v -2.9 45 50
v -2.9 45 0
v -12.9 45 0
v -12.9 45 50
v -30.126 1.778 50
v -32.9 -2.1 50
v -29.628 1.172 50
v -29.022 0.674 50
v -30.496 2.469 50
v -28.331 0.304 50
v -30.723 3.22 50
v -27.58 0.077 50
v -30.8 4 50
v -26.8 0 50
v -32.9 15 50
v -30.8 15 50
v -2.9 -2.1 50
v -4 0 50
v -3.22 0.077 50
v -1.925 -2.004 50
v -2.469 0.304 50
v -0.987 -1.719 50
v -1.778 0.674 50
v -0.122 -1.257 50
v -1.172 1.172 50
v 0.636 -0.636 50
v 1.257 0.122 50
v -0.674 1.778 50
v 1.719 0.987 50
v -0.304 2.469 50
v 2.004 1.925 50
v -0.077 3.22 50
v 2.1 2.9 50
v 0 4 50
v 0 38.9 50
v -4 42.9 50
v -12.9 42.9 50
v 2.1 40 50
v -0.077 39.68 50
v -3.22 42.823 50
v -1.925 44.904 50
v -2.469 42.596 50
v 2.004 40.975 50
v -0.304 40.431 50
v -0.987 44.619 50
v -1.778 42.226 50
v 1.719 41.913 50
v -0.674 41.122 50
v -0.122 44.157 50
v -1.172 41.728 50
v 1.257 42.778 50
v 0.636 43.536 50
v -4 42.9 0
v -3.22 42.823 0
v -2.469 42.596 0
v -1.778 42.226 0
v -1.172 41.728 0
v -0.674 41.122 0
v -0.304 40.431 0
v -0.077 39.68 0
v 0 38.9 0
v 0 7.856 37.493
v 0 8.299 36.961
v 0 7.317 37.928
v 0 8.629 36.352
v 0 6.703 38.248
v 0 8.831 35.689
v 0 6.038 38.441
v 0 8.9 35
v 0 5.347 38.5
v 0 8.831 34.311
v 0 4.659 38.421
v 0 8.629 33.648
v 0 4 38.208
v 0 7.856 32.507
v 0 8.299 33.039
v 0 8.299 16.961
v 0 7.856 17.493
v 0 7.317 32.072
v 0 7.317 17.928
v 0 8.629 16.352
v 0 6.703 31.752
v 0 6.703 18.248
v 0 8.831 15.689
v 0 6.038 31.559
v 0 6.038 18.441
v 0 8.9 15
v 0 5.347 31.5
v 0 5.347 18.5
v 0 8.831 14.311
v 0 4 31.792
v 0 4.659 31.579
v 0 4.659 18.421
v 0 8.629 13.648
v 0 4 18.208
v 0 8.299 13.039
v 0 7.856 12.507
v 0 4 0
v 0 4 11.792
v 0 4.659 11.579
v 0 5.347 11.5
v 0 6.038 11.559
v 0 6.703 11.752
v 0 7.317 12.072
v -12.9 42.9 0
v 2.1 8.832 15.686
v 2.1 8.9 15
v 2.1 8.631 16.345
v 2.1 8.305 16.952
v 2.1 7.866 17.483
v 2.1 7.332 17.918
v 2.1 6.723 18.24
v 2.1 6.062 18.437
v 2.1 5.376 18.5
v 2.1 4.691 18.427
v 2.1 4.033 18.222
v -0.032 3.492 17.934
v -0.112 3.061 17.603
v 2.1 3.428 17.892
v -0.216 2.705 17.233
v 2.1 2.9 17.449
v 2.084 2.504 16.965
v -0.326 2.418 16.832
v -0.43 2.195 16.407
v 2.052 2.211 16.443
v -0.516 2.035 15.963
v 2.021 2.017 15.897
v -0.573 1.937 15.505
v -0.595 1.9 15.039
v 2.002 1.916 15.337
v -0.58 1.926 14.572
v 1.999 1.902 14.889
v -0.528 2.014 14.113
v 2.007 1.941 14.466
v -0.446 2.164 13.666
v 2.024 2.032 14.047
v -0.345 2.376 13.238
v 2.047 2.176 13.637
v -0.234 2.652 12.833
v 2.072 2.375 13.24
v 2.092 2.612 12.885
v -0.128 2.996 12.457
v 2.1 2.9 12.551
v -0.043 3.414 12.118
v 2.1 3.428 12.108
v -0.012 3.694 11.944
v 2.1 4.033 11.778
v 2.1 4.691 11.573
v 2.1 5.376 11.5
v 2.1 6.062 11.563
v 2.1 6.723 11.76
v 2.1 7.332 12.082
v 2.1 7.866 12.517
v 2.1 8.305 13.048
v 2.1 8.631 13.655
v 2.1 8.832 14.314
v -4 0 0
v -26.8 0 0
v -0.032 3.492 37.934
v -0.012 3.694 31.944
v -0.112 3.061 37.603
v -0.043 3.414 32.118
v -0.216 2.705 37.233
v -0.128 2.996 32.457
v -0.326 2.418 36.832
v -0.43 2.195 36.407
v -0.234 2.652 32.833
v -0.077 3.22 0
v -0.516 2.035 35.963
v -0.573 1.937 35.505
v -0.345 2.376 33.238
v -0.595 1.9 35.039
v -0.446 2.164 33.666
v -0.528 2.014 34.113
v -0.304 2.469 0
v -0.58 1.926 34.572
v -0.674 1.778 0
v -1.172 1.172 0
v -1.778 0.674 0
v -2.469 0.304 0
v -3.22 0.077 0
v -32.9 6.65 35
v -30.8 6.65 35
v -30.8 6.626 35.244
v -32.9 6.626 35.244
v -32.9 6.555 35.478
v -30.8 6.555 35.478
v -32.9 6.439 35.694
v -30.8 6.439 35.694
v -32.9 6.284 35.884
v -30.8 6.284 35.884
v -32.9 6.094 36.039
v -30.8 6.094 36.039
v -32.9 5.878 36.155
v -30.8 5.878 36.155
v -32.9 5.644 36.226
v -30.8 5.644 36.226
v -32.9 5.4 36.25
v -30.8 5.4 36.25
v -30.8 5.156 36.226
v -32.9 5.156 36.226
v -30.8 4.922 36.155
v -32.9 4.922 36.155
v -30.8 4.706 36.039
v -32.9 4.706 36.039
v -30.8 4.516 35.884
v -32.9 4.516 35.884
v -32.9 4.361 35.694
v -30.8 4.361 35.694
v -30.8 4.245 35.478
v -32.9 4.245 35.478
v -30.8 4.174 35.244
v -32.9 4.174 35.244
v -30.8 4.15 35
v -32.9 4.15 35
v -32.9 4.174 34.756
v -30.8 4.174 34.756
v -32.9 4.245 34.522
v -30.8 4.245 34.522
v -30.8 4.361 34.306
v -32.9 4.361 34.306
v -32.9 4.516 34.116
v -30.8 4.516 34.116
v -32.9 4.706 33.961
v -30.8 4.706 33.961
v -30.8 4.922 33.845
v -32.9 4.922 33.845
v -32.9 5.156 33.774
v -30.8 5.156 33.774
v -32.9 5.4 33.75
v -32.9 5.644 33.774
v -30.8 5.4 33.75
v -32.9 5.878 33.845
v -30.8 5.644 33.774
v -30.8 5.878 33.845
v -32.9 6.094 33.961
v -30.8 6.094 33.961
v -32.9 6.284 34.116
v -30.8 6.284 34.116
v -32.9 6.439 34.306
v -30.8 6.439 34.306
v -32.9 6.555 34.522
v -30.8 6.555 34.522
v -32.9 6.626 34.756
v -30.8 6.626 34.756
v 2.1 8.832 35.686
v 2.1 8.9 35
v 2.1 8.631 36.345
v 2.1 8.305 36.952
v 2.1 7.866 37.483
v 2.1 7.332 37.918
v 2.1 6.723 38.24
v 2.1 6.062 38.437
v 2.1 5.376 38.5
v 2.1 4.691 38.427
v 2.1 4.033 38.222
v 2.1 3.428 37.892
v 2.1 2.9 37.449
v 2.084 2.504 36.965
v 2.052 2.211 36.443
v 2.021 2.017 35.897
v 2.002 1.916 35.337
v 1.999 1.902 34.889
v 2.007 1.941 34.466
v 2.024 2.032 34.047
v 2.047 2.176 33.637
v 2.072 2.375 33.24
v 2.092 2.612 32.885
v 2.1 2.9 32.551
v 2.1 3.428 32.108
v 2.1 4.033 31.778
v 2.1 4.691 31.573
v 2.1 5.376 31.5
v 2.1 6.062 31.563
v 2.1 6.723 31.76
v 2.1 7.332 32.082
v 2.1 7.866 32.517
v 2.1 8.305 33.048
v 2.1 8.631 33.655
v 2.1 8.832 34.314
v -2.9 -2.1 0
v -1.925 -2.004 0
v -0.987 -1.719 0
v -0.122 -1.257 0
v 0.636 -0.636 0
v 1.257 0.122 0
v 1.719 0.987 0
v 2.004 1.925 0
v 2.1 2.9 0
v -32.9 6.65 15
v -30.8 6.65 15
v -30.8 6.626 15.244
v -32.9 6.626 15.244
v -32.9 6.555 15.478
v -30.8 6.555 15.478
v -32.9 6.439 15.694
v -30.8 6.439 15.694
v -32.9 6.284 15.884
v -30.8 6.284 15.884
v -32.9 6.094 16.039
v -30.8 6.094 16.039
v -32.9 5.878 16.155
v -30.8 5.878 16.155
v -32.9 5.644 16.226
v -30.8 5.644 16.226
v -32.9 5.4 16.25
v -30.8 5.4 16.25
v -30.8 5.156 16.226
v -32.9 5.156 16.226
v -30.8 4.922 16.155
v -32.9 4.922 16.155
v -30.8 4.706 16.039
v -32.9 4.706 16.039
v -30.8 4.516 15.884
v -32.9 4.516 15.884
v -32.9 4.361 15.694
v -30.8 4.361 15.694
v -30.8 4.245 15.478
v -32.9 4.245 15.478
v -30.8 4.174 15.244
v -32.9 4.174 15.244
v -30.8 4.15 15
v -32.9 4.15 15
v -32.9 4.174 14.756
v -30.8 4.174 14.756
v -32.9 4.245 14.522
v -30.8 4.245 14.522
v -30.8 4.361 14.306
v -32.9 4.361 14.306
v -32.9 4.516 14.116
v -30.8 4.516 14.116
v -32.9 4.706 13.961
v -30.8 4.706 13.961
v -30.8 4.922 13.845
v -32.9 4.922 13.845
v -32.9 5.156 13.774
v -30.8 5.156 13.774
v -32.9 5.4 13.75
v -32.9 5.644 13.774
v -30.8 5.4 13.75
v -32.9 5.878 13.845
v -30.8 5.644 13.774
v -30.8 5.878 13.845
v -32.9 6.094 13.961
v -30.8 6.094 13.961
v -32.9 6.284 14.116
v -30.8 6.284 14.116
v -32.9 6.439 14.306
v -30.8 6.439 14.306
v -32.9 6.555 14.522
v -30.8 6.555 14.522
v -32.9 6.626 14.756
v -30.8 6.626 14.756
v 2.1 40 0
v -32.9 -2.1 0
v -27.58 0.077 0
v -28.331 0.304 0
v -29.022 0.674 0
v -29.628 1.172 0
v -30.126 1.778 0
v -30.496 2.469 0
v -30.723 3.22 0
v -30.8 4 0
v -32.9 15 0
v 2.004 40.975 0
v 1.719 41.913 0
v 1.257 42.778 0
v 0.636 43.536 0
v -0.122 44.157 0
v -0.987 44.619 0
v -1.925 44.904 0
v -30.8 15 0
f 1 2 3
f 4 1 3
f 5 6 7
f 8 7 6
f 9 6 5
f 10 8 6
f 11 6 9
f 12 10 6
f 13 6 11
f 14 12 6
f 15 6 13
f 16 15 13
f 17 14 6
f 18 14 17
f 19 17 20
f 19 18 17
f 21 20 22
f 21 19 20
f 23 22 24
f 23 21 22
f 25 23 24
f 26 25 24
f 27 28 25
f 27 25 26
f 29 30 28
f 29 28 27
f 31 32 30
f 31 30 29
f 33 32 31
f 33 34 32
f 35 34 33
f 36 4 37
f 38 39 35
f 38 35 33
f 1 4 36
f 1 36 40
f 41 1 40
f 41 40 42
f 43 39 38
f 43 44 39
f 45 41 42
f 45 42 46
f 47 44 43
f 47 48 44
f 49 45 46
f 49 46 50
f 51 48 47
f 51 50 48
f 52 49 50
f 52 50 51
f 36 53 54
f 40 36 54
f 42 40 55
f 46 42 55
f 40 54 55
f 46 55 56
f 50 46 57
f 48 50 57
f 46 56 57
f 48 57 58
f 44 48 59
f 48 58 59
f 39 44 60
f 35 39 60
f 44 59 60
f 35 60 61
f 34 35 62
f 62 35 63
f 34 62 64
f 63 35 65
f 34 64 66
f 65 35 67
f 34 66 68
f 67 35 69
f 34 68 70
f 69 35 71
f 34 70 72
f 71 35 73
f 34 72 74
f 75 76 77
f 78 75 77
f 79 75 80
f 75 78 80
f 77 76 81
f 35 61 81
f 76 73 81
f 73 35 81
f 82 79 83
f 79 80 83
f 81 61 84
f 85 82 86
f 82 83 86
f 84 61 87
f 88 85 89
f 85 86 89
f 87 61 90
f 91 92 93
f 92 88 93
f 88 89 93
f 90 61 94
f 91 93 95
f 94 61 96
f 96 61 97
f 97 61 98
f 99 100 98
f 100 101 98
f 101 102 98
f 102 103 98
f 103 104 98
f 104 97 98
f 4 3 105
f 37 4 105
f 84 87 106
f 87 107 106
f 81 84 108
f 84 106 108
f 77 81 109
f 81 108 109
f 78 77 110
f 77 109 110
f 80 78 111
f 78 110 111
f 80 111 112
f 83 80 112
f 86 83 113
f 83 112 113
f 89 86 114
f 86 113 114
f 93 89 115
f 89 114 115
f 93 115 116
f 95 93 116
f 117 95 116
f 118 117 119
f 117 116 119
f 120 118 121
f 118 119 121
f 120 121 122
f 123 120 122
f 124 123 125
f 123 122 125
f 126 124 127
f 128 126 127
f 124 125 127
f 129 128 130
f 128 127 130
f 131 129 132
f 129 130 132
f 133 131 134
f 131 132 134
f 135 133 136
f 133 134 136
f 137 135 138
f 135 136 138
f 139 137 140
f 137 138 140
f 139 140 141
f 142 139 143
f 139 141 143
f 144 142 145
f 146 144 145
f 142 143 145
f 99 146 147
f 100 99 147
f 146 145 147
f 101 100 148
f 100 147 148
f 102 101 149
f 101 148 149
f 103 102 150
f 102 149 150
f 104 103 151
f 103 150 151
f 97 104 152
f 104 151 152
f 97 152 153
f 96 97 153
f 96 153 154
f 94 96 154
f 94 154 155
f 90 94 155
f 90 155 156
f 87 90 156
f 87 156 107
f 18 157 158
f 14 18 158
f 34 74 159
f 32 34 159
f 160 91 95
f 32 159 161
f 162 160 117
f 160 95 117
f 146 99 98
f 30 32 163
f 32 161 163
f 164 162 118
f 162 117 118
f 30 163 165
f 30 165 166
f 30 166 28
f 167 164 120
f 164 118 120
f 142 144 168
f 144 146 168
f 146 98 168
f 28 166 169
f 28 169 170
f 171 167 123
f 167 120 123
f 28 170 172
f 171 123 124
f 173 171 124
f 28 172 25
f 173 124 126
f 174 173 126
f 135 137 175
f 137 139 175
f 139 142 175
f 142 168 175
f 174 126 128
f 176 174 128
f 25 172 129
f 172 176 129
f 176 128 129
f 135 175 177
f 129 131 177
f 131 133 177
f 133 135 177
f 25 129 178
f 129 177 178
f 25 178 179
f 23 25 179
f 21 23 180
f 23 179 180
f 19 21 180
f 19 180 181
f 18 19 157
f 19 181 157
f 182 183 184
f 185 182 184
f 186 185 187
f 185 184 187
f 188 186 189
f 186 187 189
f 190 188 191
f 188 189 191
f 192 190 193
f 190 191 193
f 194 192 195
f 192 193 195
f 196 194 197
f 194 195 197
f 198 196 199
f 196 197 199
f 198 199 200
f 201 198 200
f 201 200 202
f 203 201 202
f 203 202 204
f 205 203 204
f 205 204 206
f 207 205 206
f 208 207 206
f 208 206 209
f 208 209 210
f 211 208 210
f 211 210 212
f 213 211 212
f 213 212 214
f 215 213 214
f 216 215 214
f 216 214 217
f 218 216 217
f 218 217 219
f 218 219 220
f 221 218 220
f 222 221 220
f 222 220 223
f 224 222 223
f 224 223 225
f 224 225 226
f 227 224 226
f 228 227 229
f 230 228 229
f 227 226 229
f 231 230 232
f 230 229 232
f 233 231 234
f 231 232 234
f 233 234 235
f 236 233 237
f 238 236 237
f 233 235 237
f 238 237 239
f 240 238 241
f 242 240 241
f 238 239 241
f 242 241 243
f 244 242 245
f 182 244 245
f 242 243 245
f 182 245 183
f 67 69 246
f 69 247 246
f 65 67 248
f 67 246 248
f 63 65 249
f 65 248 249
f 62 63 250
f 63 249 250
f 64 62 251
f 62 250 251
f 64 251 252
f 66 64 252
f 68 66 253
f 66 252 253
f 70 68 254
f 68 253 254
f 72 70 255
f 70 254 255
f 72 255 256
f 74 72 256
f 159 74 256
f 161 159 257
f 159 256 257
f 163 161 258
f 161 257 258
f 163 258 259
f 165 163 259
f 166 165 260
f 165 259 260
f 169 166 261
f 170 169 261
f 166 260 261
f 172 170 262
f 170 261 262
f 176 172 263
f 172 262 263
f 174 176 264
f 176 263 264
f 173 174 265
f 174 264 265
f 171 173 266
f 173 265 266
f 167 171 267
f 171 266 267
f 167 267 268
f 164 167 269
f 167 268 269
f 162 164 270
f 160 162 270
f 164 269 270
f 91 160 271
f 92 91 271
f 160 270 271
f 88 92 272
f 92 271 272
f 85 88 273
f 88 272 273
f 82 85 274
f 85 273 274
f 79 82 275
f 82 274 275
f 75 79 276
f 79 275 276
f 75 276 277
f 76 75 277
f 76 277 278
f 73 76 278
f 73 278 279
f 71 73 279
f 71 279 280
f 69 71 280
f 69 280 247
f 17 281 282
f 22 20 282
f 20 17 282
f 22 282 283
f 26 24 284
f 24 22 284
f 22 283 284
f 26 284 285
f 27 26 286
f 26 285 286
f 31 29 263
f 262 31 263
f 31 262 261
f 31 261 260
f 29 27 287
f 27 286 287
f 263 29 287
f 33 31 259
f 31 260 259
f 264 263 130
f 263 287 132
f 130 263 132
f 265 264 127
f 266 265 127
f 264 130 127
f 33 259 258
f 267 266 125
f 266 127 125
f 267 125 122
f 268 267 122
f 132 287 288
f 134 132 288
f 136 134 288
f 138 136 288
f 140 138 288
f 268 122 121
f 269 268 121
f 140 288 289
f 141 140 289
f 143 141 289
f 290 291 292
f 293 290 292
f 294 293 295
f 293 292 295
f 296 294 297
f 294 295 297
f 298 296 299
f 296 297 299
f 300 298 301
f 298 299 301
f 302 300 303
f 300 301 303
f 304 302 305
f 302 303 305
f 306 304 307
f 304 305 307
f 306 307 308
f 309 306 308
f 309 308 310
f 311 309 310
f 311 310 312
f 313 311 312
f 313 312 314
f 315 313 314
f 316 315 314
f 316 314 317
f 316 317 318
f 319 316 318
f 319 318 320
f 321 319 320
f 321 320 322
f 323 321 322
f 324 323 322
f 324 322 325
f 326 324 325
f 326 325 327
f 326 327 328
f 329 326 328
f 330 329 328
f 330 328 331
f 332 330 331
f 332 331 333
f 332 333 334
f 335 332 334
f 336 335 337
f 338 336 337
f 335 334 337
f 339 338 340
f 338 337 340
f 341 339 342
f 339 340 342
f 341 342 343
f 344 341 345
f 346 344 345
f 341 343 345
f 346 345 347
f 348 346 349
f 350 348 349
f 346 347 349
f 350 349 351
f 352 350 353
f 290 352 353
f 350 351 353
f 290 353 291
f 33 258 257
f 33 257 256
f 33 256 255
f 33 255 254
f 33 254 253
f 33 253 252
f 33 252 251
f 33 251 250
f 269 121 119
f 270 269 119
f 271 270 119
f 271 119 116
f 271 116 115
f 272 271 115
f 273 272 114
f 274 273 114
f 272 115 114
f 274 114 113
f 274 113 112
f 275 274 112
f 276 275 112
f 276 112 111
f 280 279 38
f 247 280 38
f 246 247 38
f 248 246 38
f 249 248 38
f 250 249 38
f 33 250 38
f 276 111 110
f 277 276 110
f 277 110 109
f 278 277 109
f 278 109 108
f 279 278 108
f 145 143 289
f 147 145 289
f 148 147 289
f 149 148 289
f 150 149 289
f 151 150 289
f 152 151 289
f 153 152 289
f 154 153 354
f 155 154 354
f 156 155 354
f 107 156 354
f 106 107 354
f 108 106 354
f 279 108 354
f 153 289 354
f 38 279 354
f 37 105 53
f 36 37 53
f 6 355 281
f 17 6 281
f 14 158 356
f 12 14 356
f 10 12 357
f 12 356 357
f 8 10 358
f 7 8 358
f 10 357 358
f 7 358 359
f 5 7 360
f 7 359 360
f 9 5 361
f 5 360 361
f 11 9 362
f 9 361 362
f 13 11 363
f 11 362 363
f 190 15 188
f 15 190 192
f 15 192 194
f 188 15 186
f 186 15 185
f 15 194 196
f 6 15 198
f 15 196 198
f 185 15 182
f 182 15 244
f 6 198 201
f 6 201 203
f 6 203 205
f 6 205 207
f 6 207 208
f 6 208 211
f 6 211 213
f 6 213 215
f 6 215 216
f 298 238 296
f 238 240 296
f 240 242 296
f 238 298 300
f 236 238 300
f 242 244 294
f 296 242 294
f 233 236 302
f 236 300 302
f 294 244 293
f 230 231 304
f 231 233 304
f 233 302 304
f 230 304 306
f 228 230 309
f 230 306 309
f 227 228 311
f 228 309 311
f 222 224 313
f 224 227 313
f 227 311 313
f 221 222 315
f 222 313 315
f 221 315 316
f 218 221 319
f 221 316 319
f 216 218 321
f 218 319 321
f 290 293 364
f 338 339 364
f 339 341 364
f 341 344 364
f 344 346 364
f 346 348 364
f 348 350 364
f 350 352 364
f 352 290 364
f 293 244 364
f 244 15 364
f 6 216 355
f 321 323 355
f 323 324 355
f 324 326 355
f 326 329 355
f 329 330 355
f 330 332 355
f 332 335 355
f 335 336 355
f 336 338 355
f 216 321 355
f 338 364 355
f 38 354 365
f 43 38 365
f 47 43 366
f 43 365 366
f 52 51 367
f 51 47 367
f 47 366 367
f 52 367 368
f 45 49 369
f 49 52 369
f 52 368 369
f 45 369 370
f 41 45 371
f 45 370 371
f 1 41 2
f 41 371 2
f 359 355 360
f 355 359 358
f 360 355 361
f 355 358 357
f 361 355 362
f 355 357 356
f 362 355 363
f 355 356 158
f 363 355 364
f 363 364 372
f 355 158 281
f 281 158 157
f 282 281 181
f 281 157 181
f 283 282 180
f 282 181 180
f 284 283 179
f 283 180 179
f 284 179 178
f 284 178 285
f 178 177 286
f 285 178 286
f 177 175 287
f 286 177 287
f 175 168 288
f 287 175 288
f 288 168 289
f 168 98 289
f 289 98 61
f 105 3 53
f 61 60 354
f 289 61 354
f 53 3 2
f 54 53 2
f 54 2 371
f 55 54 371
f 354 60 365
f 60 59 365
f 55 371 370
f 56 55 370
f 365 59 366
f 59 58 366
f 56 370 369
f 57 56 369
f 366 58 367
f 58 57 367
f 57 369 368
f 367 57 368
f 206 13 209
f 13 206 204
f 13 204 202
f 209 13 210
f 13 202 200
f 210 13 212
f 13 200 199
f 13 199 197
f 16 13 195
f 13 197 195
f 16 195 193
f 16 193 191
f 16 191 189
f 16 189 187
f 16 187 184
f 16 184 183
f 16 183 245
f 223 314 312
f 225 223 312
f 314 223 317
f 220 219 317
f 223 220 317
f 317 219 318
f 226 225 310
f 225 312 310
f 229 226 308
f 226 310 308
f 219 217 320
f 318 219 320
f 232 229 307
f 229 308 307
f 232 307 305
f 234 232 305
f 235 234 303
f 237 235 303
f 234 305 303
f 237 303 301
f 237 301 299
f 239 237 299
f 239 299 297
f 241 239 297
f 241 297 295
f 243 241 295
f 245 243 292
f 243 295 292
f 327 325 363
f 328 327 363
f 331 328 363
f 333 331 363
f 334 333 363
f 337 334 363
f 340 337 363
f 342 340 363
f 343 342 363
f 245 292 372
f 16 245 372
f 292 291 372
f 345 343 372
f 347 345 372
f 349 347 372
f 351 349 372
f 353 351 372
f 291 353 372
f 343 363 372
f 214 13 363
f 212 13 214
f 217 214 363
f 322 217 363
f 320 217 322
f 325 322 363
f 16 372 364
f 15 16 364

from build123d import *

# Parameters (mm, degrees)
F1_DEPTH      = 50
F2_R          = 1.25
F3_DEPTH      = 32.901
F2_R_2        = 3.5
F4_DEPTH      = 2.1
F4_DEPTH_BACK = 10
F5_T1_DEPTH   = 75


# Not quite as in the source:
# - a fillet or chamfer that OpenCascade refuses, or shapes differently, is made with other operations: its cross-section is extruded or revolved along the edge and cut away or added


with BuildPart() as f1:
    # F0 (on Top) → F1 (new body)
    with BuildSketch(Plane.XY):
        with BuildLine():
            ThreePointArc((0, 4), (-1.1715728753, 1.1715728753), (-4, 0))
            Line((-4, 0), (-26.8, 0))
            ThreePointArc((-26.8, 0), (-29.6284271247, 1.1715728753), (-30.8, 4))
            Line((-30.8, 4), (-30.8, 15))
            Line((-30.8, 15), (-32.9, 15))
            Line((-32.9, 15), (-32.9, -2.1))
            Line((-32.9, -2.1), (2.1, -2.1))
            Line((2.1, -2.1), (2.1, 45))
            Line((2.1, 45), (-12.9, 45))
            Line((-12.9, 45), (-12.9, 42.9))
            Line((-12.9, 42.9), (-4, 42.9))
            ThreePointArc((-4, 42.9), (-1.1715728753, 41.7284271247), (0, 38.9))
            Line((0, 38.9), (0, 4))
        make_face()
    extrude(amount=F1_DEPTH)

    # F2 (on Right) → F3 (cut, through all)
    with BuildSketch(Plane.YZ):
        with Locations((5.4, 35)):
            Circle(F2_R)
        with Locations((5.4, 15)):
            Circle(F2_R)
    extrude(amount=-F3_DEPTH, mode=Mode.SUBTRACT)

    # F2 (on Right) → F4 (cut, two sides)
    with BuildSketch(Plane.YZ) as f4_sk:
        with Locations((5.4, 35)):
            Circle(F2_R_2)
        with Locations((5.4, 35)):
            Circle(F2_R, mode=Mode.SUBTRACT)
        with Locations((5.4, 15)):
            Circle(F2_R_2)
        with Locations((5.4, 15)):
            Circle(F2_R, mode=Mode.SUBTRACT)
        with Locations((5.4, 15)):
            Circle(F2_R)
        with Locations((5.4, 35)):
            Circle(F2_R)
    extrude(amount=F4_DEPTH, mode=Mode.SUBTRACT)
    extrude(f4_sk.sketch, amount=-F4_DEPTH_BACK, mode=Mode.SUBTRACT)

    # F5: fillet of radius 5 on 2 edges, made by hand

    # F5_s2 → F5_t1 (cut)
    with BuildSketch(Plane.XY.offset(-12.5)):
        with BuildLine():
            ThreePointArc((2.1, 40), (0.6355339059, 43.5355339059), (-2.9, 45))
            Line((-2.9, 45), (2.1, 45))
            Line((2.1, 45), (2.1, 40))
        make_face()
        with BuildLine():
            ThreePointArc((-2.9, -2.1), (0.6355339059, -0.6355339059), (2.1, 2.9))
            Line((2.1, 2.9), (2.1, -2.1))
            Line((2.1, -2.1), (-2.9, -2.1))
        make_face()
    extrude(amount=F5_T1_DEPTH, mode=Mode.SUBTRACT)


solid = f1.part
